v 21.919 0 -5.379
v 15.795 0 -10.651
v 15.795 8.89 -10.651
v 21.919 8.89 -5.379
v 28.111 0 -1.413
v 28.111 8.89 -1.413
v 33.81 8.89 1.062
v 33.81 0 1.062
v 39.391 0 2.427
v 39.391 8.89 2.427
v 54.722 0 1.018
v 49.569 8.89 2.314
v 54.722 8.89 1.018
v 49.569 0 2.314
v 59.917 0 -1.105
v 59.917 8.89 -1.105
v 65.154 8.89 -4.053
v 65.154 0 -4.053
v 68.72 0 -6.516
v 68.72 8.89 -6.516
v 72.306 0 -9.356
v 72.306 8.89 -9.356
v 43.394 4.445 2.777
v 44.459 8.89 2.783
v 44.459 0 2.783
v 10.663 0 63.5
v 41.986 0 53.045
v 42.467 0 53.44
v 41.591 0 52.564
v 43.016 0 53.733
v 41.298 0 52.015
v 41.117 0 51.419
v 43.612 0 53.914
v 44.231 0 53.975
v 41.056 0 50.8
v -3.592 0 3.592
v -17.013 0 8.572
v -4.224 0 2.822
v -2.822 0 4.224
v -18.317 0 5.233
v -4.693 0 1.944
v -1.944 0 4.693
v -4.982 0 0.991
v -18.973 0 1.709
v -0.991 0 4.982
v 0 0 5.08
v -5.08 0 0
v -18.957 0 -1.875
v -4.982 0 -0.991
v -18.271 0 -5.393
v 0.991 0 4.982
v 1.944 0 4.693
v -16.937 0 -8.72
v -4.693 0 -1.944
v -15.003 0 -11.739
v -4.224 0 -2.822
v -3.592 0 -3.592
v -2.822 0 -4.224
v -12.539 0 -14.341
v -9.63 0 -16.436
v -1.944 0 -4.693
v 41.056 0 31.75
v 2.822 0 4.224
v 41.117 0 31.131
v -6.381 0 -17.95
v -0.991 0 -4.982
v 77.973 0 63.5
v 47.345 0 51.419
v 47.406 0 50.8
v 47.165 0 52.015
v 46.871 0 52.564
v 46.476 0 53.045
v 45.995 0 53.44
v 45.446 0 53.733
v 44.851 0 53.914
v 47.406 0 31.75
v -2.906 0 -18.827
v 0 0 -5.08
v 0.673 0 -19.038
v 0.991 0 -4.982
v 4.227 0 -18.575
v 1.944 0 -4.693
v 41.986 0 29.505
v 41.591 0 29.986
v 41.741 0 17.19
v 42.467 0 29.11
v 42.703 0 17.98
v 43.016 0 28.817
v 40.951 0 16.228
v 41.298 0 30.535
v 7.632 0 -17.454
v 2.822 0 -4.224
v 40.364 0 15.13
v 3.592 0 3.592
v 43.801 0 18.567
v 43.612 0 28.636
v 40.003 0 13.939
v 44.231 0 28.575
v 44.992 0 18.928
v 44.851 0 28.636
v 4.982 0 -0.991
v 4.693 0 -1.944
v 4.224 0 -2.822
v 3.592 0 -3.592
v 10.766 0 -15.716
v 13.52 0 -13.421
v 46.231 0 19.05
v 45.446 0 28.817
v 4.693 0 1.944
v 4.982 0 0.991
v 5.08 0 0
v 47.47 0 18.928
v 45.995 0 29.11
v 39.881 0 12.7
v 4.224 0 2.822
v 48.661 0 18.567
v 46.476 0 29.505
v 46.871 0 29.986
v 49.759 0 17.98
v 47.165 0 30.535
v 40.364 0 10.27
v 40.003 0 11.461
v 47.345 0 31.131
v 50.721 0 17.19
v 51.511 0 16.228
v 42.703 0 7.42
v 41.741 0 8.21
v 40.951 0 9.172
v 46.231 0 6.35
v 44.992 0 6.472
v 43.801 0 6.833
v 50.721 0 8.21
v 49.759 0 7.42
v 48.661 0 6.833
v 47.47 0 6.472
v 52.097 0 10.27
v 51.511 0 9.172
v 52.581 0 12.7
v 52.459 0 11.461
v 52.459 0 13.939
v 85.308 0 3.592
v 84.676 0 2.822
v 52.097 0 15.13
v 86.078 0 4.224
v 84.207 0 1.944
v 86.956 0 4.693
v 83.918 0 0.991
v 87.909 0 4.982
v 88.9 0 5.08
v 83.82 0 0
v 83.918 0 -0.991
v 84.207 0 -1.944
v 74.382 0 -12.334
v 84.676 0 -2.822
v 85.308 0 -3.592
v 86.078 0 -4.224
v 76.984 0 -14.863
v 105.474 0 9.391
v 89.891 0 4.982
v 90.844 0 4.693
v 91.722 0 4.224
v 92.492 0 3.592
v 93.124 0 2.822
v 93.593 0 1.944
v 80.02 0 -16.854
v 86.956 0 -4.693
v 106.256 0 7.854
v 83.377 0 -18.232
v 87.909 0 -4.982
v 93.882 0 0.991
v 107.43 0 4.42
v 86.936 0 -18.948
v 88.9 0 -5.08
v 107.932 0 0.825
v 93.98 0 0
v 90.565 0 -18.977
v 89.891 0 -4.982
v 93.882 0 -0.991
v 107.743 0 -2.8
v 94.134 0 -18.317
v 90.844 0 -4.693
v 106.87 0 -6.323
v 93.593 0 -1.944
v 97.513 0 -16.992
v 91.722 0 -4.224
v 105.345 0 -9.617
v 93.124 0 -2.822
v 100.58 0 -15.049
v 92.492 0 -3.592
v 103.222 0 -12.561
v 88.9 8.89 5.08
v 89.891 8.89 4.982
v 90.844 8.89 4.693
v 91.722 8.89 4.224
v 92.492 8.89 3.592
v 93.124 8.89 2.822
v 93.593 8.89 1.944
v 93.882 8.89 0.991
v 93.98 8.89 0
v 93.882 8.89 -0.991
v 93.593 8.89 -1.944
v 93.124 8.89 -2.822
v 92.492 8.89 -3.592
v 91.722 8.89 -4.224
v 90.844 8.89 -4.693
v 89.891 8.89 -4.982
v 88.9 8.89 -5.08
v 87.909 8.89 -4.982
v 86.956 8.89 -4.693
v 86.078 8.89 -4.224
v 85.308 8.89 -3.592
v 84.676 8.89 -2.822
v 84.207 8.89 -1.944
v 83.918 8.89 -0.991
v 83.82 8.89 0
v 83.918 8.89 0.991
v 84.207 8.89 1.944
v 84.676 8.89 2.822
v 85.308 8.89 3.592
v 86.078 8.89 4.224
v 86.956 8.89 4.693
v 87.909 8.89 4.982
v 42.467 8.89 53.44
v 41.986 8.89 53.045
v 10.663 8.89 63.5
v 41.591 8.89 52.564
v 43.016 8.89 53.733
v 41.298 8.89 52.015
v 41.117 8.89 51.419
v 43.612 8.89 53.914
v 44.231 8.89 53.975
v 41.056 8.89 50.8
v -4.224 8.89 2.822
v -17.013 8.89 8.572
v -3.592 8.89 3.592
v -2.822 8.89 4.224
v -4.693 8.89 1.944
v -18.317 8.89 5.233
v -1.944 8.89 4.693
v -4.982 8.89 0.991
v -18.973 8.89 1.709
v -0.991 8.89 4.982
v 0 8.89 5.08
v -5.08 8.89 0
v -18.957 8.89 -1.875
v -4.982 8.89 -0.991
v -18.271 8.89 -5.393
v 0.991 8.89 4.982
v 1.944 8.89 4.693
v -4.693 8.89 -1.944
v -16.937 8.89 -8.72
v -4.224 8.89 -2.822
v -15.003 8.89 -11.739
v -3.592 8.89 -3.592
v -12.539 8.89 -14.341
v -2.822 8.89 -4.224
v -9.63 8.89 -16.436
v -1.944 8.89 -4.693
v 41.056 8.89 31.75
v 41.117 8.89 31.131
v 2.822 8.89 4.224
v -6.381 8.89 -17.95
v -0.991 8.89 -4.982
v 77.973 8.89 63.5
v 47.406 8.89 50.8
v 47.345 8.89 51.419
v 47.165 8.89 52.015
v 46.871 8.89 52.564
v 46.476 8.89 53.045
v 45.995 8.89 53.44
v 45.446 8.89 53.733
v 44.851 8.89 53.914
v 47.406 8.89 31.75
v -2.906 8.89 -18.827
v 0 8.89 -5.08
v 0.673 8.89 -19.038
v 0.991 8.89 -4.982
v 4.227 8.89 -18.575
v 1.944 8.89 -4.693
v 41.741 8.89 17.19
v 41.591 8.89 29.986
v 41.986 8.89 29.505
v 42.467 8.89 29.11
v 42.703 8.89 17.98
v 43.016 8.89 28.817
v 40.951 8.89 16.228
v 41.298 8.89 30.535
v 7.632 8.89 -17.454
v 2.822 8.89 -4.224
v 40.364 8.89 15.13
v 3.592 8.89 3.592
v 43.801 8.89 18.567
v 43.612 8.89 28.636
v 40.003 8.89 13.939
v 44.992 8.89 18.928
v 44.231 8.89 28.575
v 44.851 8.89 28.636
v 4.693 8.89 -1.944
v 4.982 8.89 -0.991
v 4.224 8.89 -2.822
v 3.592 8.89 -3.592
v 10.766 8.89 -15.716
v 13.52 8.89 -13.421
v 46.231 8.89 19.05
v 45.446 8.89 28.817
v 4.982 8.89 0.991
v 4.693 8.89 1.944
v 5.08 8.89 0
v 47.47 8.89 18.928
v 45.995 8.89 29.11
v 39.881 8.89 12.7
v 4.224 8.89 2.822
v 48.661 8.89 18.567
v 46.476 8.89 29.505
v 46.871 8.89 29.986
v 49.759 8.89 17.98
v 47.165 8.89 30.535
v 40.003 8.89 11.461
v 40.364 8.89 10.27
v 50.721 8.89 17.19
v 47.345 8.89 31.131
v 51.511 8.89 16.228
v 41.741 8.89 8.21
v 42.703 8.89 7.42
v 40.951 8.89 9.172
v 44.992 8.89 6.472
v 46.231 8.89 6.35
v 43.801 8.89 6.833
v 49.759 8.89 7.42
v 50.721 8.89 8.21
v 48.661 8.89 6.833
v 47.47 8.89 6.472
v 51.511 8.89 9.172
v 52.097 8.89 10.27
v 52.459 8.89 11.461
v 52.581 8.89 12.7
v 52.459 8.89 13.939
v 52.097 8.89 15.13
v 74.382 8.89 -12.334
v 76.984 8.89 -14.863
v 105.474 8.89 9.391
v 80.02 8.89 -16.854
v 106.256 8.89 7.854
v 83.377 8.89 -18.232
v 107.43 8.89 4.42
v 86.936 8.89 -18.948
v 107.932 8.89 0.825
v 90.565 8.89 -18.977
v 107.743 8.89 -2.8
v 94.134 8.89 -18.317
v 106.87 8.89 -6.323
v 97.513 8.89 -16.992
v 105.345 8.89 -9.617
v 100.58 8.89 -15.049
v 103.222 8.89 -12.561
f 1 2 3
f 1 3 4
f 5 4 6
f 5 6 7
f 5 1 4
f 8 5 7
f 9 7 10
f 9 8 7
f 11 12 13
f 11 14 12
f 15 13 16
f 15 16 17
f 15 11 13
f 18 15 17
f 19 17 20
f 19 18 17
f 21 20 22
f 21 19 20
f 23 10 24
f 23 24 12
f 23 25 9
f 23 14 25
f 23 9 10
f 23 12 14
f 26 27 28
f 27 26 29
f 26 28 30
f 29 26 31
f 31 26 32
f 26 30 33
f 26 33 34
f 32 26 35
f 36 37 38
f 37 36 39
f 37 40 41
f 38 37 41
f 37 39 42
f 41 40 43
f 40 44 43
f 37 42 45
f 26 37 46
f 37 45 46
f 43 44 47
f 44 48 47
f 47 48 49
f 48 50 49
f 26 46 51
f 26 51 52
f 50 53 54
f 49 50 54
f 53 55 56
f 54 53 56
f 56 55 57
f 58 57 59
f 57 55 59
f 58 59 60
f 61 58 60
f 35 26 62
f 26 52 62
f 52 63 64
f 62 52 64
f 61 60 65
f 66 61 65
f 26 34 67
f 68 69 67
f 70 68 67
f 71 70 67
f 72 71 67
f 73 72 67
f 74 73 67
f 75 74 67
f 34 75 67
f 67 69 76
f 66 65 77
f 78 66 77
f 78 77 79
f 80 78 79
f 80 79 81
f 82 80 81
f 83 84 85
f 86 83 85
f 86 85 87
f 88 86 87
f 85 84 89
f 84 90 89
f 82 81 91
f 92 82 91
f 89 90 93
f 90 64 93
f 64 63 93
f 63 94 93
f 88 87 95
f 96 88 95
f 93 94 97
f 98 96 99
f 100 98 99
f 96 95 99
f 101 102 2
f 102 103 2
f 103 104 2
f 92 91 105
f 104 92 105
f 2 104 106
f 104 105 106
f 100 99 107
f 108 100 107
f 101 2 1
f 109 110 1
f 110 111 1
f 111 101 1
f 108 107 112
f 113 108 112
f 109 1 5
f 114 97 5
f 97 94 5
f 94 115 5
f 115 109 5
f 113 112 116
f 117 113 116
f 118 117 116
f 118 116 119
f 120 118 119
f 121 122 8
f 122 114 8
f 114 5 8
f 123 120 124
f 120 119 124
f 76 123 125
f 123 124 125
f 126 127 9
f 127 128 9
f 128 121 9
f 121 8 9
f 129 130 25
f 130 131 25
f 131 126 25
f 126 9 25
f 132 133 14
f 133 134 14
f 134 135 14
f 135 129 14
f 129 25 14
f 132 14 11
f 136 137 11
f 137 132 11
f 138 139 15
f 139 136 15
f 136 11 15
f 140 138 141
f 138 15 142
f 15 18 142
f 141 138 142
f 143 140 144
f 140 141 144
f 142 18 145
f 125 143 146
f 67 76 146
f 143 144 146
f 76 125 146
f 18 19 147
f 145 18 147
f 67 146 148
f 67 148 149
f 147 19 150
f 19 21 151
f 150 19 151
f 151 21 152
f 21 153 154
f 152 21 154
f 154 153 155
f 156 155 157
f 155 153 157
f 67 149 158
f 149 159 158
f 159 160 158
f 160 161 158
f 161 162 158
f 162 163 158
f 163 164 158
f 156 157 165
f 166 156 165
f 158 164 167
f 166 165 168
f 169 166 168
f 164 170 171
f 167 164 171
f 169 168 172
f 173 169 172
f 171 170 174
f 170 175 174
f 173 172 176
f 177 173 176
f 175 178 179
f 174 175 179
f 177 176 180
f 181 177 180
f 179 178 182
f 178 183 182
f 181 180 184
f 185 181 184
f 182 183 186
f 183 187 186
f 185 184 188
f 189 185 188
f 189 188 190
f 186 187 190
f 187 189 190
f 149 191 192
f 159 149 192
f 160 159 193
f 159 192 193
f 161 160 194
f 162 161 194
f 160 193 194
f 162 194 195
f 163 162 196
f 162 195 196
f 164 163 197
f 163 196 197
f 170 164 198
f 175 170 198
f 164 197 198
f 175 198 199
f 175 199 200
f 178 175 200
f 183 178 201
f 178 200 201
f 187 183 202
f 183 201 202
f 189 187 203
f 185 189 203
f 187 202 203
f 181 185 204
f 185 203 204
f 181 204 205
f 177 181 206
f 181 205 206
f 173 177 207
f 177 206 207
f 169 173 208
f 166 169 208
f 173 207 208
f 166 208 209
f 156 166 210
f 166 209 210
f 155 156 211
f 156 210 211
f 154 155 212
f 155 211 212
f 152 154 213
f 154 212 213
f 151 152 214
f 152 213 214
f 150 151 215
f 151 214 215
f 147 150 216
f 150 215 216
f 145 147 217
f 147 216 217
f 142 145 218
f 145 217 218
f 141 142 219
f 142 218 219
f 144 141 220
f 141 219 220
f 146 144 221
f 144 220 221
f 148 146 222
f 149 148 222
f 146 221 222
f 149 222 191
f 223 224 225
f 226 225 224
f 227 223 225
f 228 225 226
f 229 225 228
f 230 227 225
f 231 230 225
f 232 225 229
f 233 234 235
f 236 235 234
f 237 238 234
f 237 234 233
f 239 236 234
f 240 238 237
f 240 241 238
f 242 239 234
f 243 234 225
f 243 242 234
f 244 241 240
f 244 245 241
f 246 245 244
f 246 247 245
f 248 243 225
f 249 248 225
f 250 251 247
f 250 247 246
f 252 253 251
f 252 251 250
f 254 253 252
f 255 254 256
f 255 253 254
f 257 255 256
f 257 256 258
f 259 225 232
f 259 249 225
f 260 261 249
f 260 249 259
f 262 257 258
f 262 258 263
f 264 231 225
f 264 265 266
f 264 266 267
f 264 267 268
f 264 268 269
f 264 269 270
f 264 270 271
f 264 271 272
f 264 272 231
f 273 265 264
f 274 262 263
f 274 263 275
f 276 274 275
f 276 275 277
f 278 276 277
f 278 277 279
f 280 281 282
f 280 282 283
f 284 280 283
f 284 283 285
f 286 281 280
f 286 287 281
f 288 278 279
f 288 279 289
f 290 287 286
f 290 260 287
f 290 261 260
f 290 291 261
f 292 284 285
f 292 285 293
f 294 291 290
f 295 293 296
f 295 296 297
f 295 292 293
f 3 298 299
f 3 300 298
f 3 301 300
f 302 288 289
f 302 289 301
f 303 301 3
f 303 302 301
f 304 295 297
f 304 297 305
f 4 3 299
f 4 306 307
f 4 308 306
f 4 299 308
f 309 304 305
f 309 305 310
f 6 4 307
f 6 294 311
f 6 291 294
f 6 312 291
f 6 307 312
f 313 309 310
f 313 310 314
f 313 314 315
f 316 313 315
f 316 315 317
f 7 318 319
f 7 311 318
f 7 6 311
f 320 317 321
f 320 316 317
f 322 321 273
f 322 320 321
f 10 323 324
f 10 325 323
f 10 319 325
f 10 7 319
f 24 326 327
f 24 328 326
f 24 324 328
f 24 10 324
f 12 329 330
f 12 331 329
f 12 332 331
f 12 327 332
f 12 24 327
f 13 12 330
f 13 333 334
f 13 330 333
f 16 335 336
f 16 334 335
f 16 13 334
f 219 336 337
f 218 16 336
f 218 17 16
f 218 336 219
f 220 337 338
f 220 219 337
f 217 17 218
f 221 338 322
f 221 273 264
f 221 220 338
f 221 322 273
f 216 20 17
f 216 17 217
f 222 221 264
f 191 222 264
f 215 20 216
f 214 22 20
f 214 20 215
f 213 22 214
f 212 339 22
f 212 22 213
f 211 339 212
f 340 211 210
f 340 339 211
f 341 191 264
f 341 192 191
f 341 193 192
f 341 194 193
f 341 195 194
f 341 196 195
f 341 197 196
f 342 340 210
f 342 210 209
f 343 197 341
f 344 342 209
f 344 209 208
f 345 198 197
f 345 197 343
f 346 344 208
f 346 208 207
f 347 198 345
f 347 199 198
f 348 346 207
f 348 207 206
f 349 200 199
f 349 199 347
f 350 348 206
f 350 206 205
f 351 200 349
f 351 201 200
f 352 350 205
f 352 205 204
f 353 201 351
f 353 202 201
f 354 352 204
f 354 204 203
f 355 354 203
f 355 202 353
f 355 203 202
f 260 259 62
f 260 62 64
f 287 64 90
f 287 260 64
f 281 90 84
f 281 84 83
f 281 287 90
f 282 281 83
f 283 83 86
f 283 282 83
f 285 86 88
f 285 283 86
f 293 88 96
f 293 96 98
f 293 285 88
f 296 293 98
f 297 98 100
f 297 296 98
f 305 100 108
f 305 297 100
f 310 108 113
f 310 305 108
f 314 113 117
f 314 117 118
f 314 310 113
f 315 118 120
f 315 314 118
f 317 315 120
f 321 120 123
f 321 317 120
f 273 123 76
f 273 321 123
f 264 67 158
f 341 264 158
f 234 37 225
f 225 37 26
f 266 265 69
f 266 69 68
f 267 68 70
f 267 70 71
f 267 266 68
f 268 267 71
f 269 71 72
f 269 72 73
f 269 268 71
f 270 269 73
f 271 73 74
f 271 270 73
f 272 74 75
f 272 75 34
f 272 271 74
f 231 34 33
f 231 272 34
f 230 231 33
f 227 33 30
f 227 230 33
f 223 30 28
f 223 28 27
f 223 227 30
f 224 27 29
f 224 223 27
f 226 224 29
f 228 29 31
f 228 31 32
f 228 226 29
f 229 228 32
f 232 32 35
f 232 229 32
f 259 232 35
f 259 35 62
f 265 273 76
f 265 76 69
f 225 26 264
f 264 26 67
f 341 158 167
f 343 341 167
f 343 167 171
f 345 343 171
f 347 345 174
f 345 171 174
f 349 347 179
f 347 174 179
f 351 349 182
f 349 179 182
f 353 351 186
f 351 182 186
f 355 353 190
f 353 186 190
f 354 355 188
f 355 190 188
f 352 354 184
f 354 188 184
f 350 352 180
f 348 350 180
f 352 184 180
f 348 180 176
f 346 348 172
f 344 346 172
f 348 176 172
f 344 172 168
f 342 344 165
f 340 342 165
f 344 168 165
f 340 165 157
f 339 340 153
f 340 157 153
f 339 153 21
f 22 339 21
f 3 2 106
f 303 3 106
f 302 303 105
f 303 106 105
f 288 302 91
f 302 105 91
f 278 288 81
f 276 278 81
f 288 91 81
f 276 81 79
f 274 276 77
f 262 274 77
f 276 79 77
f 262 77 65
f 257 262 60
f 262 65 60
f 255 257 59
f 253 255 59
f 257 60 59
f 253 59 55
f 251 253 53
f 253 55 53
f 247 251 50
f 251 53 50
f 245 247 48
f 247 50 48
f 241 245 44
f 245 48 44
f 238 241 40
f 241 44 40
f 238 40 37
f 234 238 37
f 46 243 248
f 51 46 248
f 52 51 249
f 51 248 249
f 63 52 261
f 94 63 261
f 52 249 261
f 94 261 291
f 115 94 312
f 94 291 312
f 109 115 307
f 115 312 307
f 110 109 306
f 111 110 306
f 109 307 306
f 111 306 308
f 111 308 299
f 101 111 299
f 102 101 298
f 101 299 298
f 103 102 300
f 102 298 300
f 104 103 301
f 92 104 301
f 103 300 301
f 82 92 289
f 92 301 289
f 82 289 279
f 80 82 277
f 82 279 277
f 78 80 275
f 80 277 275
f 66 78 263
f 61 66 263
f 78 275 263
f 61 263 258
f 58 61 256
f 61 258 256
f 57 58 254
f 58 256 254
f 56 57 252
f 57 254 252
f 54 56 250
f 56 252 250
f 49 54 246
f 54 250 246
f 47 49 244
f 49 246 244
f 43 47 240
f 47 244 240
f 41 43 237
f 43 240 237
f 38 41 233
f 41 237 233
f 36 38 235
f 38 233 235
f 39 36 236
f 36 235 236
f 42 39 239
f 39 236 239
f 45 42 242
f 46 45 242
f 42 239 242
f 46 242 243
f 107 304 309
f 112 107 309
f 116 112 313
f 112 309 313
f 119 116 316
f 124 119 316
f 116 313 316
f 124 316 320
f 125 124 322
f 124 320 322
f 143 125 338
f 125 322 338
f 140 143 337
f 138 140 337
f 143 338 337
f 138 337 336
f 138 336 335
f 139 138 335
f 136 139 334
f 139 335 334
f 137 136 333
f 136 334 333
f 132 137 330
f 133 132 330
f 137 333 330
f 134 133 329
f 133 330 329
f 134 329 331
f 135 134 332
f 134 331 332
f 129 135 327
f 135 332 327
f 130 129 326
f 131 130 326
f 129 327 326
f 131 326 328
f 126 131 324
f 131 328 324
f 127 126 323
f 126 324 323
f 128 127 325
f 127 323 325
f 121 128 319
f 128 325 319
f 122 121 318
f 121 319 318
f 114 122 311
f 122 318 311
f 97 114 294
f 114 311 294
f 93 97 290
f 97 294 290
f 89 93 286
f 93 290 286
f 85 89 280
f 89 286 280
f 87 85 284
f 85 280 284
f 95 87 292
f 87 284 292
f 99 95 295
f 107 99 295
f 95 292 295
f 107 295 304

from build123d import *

# Parameters (mm, degrees)
BOSS_EXTRUDE1_DEPTH = 8.89
CUT_EXTRUDE1_DEPTH  = 8.89
SKETCH3_R           = 5.08
CUT_EXTRUDE2_DEPTH  = 8.89
SKETCH4_R           = 5.08
CUT_EXTRUDE3_DEPTH  = 8.89
SKETCH5_R           = 6.35
CUT_EXTRUDE4_DEPTH  = 8.89


with BuildPart() as part:
    # Sketch1 → Boss-Extrude1 (new body)
    with BuildSketch(Plane(origin=(0, 0, 0), x_dir=(1, 0, 0), z_dir=(0, 1, 0))):
        with BuildLine():
            Line((-17.012597889, -8.571698377), (10.66270702, -63.5))
            Line((10.66270702, -63.5), (77.97270702, -63.5))
            Line((77.97270702, -63.5), (105.474181334, -9.391432964))
            Line((105.474181334, -9.391432964), (106.255653047, -7.853903954))
            ThreePointArc((106.255653047, -7.853903954), (97.513383696, 16.99153087), (72.305806006, 9.35602617))
            add(Edge.make_bspline(
                [(15.794561963, 10.650554558), (42.737740309, -15.557403772), (72.305806006, 9.35602617)],
                knots=[0, 0, 0, 1, 1, 1], degree=2))
            ThreePointArc((15.794561963, 10.650554558), (-9.630402632, 16.436479098), (-17.012597889, -8.571698377))
        make_face()
    extrude(amount=BOSS_EXTRUDE1_DEPTH)

    # Sketch2 → Cut-Extrude1 (cut)
    with BuildSketch(Plane(origin=(0, 8.89, 0), x_dir=(1, 0, 0), z_dir=(0, 1, 0))):
        with BuildLine():
            Line((47.406198559, -31.75), (47.406198559, -50.8))
            ThreePointArc((47.406198559, -50.8), (44.231198559, -53.975), (41.056198559, -50.8))
            Line((41.056198559, -50.8), (41.056198559, -31.75))
            ThreePointArc((41.056198559, -31.75), (44.231198559, -28.575), (47.406198559, -31.75))
        make_face()
    extrude(amount=-CUT_EXTRUDE1_DEPTH, mode=Mode.SUBTRACT)

    # Sketch3 → Cut-Extrude2 (cut)
    with BuildSketch(Plane(origin=(0, 8.89, 0), x_dir=(1, 0, 0), z_dir=(0, 1, 0))):
        with Locations(Location((0, 0, 0), (0, 0, 270))):
            Circle(SKETCH3_R)
    extrude(amount=-CUT_EXTRUDE2_DEPTH, mode=Mode.SUBTRACT)

    # Sketch4 → Cut-Extrude3 (cut)
    with BuildSketch(Plane(origin=(0, 8.89, 0), x_dir=(1, 0, 0), z_dir=(0, 1, 0))):
        with Locations(Location((88.9, 0, 0), (0, 0, 270))):
            Circle(SKETCH4_R)
    extrude(amount=-CUT_EXTRUDE3_DEPTH, mode=Mode.SUBTRACT)

    # Sketch5 → Cut-Extrude4 (cut)
    with BuildSketch(Plane(origin=(0, 8.89, 0), x_dir=(1, 0, 0), z_dir=(0, 1, 0))):
        with Locations(Location((46.230762454, -12.7, 0), (0, 0, 270))):
            Circle(SKETCH5_R)
    extrude(amount=-CUT_EXTRUDE4_DEPTH, mode=Mode.SUBTRACT)


solid = part.part
